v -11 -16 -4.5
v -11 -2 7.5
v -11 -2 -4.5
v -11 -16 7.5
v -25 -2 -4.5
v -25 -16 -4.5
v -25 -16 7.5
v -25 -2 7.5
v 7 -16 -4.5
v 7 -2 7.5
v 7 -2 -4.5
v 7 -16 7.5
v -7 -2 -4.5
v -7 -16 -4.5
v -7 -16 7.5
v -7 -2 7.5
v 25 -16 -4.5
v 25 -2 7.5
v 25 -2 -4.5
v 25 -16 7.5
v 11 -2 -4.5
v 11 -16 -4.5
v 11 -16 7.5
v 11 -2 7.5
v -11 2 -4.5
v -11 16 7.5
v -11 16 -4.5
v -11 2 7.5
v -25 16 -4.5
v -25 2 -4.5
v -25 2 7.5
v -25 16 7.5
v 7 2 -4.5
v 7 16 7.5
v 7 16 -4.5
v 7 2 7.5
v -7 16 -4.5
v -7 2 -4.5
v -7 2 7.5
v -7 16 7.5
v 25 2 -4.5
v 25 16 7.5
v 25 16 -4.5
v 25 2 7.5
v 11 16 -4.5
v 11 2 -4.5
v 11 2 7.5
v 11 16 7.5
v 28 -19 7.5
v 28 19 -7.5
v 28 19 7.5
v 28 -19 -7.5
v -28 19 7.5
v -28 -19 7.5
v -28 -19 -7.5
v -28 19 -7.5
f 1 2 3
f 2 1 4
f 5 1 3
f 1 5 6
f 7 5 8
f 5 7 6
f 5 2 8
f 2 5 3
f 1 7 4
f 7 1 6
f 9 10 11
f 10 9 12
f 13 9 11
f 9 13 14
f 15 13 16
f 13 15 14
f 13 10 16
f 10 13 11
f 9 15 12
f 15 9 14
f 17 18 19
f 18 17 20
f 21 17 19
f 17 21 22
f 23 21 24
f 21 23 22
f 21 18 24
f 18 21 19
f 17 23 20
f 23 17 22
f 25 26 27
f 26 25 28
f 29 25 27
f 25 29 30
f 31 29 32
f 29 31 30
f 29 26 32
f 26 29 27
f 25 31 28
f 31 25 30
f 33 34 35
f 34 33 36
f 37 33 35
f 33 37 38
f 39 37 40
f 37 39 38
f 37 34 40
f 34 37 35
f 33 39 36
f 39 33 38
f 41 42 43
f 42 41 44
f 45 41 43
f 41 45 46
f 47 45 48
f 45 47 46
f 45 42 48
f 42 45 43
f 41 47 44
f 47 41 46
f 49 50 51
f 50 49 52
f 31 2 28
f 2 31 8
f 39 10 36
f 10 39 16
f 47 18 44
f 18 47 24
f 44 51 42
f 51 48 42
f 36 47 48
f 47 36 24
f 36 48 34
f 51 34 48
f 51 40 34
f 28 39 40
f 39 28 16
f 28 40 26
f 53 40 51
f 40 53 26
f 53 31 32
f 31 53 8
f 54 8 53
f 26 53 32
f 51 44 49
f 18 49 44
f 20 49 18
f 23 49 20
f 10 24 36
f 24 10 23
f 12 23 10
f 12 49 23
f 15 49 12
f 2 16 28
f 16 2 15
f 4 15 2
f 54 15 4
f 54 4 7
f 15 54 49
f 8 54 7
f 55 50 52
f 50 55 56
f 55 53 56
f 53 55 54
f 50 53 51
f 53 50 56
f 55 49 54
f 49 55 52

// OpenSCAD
$fn = 32;

// ----------------------------------------------------------------------
// Pocket plate 56 x 38 x 15
// 2 x 3 pockets 14 mm square, 12 mm deep
// ----------------------------------------------------------------------

// --- parameters (mm) ---
thickness = 15;  // plate thickness
floor_t = 3;     // material left under each pocket
pocket = 14;     // pocket side length
pitch_x = 18;    // pocket pitch along X
pitch_y = 18;    // pocket pitch along Y
cols = 3;        // pockets per row
rows = 2;        // rows of pockets

// --- derived feature positions (mm) ---
depth = thickness - floor_t;        // = 12   pocket depth, down to the floor
span_x = (cols - 1) * pitch_x;      // = 36   distance between outer pockets
span_y = (rows - 1) * pitch_y;      // = 18   distance between outer pocket rows
origin_x = -span_x / 2;             // = -18   X of the first pocket
origin_y = -span_y / 2;             // = -9   Y of the first pocket
plate = [span_x + pocket + 6, span_y + pocket + 6, thickness];  // = [56, 38, 15]   overall size: pockets plus 3 mm of wall on each side
feature_centers = [
  [origin_x + 0 * pitch_x, origin_y + 0 * pitch_y],
  [origin_x + 1 * pitch_x, origin_y + 0 * pitch_y],
  [origin_x + 2 * pitch_x, origin_y + 0 * pitch_y],
  [origin_x + 0 * pitch_x, origin_y + 1 * pitch_y],
  [origin_x + 1 * pitch_x, origin_y + 1 * pitch_y],
  [origin_x + 2 * pitch_x, origin_y + 1 * pitch_y]
];   // pocket centres, used verbatim by the cutter loop

// plate outline, then one pocket per centre in feature_centers
difference() {
  cube(plate, center = true);
  for (centre = feature_centers)
    translate([centre[0] - pocket / 2, centre[1] - pocket / 2, plate[2] / 2 - depth])
      cube([pocket, pocket, depth + 1]);  // centred on the declared pocket centre
}
